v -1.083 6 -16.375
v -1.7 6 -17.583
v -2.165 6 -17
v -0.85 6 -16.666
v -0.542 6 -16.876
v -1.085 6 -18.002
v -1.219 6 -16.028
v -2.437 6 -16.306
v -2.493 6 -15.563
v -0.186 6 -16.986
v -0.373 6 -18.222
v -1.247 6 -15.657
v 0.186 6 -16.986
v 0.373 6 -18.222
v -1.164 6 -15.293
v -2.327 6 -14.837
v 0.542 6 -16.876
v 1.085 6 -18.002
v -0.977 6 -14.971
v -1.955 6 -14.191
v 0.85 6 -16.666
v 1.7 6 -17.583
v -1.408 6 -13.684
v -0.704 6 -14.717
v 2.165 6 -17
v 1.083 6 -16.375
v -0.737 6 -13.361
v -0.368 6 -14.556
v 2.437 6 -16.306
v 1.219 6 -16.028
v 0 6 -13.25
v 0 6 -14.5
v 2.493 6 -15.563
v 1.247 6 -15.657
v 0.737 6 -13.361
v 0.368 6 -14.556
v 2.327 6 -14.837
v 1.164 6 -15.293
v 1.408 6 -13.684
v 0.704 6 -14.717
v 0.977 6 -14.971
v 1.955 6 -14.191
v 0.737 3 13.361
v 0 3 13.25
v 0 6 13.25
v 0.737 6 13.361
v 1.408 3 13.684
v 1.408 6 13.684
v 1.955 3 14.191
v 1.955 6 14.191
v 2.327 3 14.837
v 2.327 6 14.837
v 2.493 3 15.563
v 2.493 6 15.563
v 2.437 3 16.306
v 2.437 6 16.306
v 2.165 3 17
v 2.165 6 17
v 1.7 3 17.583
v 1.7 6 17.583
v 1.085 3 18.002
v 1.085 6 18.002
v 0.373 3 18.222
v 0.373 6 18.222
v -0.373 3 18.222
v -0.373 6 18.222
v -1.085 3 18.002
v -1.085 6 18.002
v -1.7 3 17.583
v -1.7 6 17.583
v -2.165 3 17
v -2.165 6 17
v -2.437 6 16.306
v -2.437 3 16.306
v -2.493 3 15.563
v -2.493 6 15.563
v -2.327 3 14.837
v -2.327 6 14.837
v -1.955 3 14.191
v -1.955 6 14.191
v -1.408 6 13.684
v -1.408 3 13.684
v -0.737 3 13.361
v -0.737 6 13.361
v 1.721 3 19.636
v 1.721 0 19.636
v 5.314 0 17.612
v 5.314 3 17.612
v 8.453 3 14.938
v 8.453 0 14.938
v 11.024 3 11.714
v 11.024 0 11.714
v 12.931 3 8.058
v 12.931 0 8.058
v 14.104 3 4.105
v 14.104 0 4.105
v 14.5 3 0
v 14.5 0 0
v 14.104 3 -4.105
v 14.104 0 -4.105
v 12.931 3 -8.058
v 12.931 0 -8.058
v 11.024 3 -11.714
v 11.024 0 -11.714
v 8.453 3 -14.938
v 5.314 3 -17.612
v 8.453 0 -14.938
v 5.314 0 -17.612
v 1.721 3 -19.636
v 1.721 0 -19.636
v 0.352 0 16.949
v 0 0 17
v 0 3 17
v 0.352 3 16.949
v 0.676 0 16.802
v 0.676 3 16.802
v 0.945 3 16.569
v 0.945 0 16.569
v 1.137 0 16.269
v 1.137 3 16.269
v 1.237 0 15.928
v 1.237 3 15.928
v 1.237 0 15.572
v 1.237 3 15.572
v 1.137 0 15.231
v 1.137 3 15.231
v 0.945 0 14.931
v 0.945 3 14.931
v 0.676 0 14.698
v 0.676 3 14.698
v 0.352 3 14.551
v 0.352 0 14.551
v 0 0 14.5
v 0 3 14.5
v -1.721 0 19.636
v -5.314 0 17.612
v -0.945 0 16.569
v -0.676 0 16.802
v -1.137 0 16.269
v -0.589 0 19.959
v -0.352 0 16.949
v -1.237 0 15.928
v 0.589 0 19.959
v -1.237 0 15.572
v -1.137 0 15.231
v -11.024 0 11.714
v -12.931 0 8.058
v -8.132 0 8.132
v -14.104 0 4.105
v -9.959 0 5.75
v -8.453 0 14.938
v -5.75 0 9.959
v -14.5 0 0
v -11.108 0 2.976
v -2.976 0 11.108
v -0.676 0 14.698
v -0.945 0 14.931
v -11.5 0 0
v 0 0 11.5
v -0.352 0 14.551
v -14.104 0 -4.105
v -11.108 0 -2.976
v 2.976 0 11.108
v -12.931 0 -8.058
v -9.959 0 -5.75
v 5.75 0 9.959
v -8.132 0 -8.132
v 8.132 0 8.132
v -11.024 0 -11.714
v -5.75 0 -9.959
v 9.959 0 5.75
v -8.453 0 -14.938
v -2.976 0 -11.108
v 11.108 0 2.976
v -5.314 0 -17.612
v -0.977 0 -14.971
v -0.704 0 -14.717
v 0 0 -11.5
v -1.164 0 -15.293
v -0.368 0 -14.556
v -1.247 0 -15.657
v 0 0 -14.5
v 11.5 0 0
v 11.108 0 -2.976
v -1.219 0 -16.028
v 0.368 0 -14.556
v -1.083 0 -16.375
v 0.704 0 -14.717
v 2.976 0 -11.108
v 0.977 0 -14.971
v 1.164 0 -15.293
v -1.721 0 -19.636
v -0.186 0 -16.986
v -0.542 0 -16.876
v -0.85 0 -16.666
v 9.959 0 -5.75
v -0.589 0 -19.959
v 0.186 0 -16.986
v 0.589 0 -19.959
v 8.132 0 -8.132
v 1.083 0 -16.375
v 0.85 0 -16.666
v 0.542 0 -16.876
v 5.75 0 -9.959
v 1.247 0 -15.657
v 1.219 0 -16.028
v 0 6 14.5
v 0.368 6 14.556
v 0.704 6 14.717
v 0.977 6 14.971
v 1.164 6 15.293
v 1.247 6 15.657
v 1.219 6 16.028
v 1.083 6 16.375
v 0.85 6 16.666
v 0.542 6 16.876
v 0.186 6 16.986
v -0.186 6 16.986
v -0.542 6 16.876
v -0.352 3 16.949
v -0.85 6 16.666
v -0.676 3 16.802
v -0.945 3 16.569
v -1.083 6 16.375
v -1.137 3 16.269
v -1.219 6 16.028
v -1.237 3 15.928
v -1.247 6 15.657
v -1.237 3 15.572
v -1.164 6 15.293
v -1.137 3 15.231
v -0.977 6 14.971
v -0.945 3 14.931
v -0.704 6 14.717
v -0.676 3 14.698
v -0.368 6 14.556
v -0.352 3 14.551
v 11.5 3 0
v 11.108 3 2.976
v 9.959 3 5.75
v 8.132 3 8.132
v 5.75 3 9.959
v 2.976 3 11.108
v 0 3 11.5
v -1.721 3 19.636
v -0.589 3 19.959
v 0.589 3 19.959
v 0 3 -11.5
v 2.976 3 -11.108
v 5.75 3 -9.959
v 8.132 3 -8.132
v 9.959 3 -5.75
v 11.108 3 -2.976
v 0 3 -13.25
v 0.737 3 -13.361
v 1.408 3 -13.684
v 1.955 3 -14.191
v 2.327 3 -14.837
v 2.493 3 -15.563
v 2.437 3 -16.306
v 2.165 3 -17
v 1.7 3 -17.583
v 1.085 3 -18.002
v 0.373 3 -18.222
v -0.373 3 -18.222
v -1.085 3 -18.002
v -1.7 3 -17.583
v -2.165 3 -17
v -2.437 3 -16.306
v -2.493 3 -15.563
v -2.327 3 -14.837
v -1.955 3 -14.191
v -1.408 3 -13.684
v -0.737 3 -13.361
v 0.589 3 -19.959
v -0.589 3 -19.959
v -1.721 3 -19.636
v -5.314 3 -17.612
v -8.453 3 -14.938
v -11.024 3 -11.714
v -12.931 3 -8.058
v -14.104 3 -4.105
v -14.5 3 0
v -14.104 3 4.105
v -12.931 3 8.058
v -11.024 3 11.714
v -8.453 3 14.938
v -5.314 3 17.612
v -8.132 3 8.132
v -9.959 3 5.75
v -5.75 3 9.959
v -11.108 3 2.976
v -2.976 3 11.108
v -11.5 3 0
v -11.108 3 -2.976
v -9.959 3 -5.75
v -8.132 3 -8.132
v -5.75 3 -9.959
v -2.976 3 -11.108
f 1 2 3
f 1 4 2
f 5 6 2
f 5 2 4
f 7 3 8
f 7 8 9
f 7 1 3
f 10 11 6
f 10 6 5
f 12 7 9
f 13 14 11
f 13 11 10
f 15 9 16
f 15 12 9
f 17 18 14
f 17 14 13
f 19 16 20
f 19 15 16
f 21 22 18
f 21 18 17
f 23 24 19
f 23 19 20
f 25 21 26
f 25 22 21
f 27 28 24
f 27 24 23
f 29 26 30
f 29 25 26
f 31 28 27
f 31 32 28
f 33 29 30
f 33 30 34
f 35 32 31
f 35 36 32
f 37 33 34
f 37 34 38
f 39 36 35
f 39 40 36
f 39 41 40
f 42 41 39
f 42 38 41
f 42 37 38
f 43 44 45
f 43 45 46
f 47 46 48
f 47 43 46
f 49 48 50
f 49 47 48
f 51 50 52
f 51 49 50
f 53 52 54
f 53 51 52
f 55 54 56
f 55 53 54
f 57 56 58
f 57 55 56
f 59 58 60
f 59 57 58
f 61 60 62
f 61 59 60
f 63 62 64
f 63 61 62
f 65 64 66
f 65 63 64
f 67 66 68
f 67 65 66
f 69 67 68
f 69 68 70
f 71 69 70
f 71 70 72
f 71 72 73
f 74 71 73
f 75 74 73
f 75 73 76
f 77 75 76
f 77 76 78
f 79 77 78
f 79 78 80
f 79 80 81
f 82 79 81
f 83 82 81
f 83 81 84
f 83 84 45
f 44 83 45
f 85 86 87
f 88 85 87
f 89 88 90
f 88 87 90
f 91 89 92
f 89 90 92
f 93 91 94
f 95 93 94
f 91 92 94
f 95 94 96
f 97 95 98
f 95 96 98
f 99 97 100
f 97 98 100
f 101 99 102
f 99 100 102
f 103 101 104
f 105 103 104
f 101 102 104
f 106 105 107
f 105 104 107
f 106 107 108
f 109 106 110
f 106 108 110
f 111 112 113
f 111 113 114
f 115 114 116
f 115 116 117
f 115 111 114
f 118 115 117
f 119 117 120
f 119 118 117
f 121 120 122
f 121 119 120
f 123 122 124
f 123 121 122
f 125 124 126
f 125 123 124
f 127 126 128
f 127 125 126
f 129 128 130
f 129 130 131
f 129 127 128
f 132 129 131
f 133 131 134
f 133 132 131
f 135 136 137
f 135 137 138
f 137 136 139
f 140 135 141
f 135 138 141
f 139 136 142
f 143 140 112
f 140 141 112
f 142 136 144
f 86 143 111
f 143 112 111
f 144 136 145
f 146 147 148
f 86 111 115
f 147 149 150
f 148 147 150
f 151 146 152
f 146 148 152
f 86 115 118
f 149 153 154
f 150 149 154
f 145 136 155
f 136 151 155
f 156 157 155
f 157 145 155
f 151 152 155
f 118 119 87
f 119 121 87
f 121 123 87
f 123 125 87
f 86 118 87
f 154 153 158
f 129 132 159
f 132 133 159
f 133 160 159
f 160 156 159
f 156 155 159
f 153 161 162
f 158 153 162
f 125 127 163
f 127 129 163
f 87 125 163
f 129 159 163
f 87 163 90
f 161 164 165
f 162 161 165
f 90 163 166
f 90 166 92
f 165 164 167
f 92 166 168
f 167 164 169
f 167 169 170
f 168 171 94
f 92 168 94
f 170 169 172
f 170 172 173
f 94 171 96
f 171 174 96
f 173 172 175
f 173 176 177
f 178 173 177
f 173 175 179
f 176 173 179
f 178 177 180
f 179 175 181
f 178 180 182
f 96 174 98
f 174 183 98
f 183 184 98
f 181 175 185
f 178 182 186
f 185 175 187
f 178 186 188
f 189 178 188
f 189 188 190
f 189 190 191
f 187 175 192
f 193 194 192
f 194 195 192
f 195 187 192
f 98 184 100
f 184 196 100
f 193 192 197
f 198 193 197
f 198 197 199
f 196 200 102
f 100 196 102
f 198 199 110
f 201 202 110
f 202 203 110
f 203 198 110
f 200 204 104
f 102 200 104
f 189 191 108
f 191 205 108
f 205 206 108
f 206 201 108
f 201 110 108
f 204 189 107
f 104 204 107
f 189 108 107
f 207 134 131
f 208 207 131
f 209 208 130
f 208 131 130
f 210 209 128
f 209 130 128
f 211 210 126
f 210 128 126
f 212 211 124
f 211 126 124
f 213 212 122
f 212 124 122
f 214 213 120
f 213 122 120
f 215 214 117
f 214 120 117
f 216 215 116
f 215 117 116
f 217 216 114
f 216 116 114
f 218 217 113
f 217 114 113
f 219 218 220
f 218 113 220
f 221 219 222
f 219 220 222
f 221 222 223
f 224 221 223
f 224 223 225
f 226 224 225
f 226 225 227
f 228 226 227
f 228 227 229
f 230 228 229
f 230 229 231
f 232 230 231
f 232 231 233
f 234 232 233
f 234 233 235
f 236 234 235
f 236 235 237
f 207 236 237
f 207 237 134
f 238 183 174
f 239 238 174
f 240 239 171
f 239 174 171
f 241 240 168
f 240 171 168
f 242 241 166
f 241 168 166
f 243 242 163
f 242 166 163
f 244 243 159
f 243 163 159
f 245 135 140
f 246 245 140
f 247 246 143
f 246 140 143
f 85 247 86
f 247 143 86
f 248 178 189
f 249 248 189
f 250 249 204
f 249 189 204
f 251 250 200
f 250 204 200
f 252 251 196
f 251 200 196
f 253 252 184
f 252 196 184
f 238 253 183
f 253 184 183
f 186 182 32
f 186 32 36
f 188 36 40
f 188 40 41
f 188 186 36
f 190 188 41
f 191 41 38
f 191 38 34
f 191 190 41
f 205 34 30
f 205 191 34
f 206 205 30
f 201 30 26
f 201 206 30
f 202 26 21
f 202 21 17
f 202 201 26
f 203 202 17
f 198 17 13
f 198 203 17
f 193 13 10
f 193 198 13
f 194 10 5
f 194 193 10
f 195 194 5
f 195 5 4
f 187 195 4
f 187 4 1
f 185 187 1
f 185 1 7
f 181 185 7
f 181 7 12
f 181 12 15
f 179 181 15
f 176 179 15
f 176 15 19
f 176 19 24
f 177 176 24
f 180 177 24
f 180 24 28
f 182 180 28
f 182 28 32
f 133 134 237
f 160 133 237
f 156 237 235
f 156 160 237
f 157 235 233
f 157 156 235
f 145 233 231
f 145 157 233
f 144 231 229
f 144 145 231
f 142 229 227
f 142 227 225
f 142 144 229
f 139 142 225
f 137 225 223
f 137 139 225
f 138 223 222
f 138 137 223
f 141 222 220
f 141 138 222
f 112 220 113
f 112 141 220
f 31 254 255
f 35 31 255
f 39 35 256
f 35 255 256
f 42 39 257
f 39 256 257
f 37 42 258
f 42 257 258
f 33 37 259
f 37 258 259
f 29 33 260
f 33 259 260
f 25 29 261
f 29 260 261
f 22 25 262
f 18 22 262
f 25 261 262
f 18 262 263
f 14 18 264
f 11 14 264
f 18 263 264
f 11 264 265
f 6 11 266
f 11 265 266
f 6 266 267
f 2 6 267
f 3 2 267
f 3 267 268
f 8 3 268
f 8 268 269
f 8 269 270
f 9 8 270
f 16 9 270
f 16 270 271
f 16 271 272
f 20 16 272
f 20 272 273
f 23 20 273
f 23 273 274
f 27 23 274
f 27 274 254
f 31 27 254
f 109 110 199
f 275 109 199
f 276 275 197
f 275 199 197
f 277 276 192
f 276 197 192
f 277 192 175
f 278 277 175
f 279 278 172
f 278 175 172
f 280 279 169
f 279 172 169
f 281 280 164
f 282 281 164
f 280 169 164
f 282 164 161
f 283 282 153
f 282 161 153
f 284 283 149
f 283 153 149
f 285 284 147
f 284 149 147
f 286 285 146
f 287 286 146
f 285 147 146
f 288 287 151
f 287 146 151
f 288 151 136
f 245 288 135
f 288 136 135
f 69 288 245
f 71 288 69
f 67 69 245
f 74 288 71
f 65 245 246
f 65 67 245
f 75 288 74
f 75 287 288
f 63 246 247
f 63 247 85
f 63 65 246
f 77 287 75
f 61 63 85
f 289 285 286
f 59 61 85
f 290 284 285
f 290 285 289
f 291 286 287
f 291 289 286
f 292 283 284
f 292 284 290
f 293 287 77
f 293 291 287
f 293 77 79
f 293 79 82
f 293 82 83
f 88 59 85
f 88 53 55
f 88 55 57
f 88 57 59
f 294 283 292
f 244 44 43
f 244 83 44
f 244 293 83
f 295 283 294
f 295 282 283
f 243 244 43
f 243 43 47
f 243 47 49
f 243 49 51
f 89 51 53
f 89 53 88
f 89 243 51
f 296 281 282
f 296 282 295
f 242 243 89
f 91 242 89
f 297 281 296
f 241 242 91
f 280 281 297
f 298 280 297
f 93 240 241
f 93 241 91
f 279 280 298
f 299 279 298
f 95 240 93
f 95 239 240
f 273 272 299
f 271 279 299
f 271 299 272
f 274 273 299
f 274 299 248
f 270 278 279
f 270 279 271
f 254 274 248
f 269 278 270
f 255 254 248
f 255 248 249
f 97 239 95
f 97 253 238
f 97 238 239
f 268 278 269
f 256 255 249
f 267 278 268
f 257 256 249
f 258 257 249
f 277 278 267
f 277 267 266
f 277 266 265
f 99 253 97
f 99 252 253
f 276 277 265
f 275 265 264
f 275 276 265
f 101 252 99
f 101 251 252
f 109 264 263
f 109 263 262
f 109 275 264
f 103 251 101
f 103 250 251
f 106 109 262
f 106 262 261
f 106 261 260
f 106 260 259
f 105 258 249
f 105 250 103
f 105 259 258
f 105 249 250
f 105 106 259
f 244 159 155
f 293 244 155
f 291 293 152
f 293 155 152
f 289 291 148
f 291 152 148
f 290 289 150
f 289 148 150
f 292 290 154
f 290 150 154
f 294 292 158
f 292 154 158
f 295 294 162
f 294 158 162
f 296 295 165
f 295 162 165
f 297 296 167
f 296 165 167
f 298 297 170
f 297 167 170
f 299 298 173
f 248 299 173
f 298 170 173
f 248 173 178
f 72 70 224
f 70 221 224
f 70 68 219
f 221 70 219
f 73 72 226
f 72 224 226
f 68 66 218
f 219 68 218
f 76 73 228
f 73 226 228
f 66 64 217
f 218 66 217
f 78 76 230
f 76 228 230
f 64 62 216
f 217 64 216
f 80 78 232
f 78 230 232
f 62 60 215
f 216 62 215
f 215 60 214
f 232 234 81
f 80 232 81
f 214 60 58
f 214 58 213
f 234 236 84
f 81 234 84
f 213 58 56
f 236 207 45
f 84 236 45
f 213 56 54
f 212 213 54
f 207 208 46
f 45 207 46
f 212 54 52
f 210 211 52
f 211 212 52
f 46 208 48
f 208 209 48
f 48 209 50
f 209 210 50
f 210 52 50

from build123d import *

# Parameters (mm, degrees)
SKETCH1_R           = 4.25
SKETCH1_R_2         = 1.25
BOSS_EXTRUDE1_DEPTH = 3
BOSS_EXTRUDE2_START = -3
SKETCH2_R           = 2.5
SKETCH2_R_2         = 1.25
BOSS_EXTRUDE2_DEPTH = 6


with BuildPart() as part:
    # Sketch1 → Boss-Extrude1 (new body)
    # profile 1 of 4: a face of its own
    with BuildSketch(Plane(origin=(0, 0, 0), x_dir=(1, 0, 0), z_dir=(0, 1, 0))):
        with BuildLine():
            ThreePointArc((1.6e-08, -11.5), (-11.5, -2.4e-08), (-3.2e-08, 11.5))
            ThreePointArc((-3.2e-08, 11.5), (-4.157986242, 14.870426004), (-1.721061947, 19.635929204))
            ThreePointArc((-1.721061947, 19.635929204), (-14.5, 0), (-1.721061947, -19.635929204))
            ThreePointArc((-1.721061947, -19.635929204), (-4.157986237, -14.87042598), (1.6e-08, -11.5))
        make_face()
    # profile 2 of 4: a face of its own
    with BuildSketch(Plane(origin=(0, 0, 0), x_dir=(1, 0, 0), z_dir=(0, 1, 0))):
        with BuildLine():
            ThreePointArc((1.721061947, 19.635929204), (3.562093014, 18.068187517), (4.25, 15.75))
            ThreePointArc((4.25, 15.75), (3.005203809, 12.744796169), (-3.2e-08, 11.5))
            ThreePointArc((-3.2e-08, 11.5), (8.131727972, 8.131727995), (11.5, 0))
            ThreePointArc((11.5, 0), (8.131727989, -8.131727978), (1.6e-08, -11.5))
            ThreePointArc((1.6e-08, -11.5), (3.005203826, -12.744796186), (4.25, -15.75))
            ThreePointArc((4.25, -15.75), (3.562093014, -18.068187517), (1.721061947, -19.635929204))
            ThreePointArc((1.721061947, -19.635929204), (14.5, 0), (1.721061947, 19.635929204))
        make_face()
    # profile 3 of 4: a face of its own
    with BuildSketch(Plane(origin=(0, 0, 0), x_dir=(1, 0, 0), z_dir=(0, 1, 0))):
        with Locations((0, 15.75)):
            Circle(SKETCH1_R)
        with Locations(Location((0, 15.75, 0), (0, 0, 270))):
            Circle(SKETCH1_R_2, mode=Mode.SUBTRACT)
    # profile 4 of 4: a face of its own
    with BuildSketch(Plane(origin=(0, 0, 0), x_dir=(1, 0, 0), z_dir=(0, 1, 0))):
        with Locations((0, -15.75)):
            Circle(SKETCH1_R)
        with Locations(Location((0, -15.75, 0), (0, 0, 270))):
            Circle(SKETCH1_R_2, mode=Mode.SUBTRACT)
    extrude(amount=BOSS_EXTRUDE1_DEPTH)

    # Sketch2 → Boss-Extrude2 (add)
    with BuildSketch(Plane(origin=(0, 3, 0), x_dir=(1, 0, 0), z_dir=(0, 1, 0)).offset(BOSS_EXTRUDE2_START)):
        with Locations(Location((0, 15.75, 0), (0, 0, 270))):
            Circle(SKETCH2_R)
        with Locations(Location((0, 15.75, 0), (0, 0, 270))):
            Circle(SKETCH2_R_2, mode=Mode.SUBTRACT)
    boss_extrude2 = extrude(amount=BOSS_EXTRUDE2_DEPTH)

    # Mirror1: Boss-Extrude2 across plane
    add(boss_extrude2.mirror(Plane.XY))


solid = part.part
